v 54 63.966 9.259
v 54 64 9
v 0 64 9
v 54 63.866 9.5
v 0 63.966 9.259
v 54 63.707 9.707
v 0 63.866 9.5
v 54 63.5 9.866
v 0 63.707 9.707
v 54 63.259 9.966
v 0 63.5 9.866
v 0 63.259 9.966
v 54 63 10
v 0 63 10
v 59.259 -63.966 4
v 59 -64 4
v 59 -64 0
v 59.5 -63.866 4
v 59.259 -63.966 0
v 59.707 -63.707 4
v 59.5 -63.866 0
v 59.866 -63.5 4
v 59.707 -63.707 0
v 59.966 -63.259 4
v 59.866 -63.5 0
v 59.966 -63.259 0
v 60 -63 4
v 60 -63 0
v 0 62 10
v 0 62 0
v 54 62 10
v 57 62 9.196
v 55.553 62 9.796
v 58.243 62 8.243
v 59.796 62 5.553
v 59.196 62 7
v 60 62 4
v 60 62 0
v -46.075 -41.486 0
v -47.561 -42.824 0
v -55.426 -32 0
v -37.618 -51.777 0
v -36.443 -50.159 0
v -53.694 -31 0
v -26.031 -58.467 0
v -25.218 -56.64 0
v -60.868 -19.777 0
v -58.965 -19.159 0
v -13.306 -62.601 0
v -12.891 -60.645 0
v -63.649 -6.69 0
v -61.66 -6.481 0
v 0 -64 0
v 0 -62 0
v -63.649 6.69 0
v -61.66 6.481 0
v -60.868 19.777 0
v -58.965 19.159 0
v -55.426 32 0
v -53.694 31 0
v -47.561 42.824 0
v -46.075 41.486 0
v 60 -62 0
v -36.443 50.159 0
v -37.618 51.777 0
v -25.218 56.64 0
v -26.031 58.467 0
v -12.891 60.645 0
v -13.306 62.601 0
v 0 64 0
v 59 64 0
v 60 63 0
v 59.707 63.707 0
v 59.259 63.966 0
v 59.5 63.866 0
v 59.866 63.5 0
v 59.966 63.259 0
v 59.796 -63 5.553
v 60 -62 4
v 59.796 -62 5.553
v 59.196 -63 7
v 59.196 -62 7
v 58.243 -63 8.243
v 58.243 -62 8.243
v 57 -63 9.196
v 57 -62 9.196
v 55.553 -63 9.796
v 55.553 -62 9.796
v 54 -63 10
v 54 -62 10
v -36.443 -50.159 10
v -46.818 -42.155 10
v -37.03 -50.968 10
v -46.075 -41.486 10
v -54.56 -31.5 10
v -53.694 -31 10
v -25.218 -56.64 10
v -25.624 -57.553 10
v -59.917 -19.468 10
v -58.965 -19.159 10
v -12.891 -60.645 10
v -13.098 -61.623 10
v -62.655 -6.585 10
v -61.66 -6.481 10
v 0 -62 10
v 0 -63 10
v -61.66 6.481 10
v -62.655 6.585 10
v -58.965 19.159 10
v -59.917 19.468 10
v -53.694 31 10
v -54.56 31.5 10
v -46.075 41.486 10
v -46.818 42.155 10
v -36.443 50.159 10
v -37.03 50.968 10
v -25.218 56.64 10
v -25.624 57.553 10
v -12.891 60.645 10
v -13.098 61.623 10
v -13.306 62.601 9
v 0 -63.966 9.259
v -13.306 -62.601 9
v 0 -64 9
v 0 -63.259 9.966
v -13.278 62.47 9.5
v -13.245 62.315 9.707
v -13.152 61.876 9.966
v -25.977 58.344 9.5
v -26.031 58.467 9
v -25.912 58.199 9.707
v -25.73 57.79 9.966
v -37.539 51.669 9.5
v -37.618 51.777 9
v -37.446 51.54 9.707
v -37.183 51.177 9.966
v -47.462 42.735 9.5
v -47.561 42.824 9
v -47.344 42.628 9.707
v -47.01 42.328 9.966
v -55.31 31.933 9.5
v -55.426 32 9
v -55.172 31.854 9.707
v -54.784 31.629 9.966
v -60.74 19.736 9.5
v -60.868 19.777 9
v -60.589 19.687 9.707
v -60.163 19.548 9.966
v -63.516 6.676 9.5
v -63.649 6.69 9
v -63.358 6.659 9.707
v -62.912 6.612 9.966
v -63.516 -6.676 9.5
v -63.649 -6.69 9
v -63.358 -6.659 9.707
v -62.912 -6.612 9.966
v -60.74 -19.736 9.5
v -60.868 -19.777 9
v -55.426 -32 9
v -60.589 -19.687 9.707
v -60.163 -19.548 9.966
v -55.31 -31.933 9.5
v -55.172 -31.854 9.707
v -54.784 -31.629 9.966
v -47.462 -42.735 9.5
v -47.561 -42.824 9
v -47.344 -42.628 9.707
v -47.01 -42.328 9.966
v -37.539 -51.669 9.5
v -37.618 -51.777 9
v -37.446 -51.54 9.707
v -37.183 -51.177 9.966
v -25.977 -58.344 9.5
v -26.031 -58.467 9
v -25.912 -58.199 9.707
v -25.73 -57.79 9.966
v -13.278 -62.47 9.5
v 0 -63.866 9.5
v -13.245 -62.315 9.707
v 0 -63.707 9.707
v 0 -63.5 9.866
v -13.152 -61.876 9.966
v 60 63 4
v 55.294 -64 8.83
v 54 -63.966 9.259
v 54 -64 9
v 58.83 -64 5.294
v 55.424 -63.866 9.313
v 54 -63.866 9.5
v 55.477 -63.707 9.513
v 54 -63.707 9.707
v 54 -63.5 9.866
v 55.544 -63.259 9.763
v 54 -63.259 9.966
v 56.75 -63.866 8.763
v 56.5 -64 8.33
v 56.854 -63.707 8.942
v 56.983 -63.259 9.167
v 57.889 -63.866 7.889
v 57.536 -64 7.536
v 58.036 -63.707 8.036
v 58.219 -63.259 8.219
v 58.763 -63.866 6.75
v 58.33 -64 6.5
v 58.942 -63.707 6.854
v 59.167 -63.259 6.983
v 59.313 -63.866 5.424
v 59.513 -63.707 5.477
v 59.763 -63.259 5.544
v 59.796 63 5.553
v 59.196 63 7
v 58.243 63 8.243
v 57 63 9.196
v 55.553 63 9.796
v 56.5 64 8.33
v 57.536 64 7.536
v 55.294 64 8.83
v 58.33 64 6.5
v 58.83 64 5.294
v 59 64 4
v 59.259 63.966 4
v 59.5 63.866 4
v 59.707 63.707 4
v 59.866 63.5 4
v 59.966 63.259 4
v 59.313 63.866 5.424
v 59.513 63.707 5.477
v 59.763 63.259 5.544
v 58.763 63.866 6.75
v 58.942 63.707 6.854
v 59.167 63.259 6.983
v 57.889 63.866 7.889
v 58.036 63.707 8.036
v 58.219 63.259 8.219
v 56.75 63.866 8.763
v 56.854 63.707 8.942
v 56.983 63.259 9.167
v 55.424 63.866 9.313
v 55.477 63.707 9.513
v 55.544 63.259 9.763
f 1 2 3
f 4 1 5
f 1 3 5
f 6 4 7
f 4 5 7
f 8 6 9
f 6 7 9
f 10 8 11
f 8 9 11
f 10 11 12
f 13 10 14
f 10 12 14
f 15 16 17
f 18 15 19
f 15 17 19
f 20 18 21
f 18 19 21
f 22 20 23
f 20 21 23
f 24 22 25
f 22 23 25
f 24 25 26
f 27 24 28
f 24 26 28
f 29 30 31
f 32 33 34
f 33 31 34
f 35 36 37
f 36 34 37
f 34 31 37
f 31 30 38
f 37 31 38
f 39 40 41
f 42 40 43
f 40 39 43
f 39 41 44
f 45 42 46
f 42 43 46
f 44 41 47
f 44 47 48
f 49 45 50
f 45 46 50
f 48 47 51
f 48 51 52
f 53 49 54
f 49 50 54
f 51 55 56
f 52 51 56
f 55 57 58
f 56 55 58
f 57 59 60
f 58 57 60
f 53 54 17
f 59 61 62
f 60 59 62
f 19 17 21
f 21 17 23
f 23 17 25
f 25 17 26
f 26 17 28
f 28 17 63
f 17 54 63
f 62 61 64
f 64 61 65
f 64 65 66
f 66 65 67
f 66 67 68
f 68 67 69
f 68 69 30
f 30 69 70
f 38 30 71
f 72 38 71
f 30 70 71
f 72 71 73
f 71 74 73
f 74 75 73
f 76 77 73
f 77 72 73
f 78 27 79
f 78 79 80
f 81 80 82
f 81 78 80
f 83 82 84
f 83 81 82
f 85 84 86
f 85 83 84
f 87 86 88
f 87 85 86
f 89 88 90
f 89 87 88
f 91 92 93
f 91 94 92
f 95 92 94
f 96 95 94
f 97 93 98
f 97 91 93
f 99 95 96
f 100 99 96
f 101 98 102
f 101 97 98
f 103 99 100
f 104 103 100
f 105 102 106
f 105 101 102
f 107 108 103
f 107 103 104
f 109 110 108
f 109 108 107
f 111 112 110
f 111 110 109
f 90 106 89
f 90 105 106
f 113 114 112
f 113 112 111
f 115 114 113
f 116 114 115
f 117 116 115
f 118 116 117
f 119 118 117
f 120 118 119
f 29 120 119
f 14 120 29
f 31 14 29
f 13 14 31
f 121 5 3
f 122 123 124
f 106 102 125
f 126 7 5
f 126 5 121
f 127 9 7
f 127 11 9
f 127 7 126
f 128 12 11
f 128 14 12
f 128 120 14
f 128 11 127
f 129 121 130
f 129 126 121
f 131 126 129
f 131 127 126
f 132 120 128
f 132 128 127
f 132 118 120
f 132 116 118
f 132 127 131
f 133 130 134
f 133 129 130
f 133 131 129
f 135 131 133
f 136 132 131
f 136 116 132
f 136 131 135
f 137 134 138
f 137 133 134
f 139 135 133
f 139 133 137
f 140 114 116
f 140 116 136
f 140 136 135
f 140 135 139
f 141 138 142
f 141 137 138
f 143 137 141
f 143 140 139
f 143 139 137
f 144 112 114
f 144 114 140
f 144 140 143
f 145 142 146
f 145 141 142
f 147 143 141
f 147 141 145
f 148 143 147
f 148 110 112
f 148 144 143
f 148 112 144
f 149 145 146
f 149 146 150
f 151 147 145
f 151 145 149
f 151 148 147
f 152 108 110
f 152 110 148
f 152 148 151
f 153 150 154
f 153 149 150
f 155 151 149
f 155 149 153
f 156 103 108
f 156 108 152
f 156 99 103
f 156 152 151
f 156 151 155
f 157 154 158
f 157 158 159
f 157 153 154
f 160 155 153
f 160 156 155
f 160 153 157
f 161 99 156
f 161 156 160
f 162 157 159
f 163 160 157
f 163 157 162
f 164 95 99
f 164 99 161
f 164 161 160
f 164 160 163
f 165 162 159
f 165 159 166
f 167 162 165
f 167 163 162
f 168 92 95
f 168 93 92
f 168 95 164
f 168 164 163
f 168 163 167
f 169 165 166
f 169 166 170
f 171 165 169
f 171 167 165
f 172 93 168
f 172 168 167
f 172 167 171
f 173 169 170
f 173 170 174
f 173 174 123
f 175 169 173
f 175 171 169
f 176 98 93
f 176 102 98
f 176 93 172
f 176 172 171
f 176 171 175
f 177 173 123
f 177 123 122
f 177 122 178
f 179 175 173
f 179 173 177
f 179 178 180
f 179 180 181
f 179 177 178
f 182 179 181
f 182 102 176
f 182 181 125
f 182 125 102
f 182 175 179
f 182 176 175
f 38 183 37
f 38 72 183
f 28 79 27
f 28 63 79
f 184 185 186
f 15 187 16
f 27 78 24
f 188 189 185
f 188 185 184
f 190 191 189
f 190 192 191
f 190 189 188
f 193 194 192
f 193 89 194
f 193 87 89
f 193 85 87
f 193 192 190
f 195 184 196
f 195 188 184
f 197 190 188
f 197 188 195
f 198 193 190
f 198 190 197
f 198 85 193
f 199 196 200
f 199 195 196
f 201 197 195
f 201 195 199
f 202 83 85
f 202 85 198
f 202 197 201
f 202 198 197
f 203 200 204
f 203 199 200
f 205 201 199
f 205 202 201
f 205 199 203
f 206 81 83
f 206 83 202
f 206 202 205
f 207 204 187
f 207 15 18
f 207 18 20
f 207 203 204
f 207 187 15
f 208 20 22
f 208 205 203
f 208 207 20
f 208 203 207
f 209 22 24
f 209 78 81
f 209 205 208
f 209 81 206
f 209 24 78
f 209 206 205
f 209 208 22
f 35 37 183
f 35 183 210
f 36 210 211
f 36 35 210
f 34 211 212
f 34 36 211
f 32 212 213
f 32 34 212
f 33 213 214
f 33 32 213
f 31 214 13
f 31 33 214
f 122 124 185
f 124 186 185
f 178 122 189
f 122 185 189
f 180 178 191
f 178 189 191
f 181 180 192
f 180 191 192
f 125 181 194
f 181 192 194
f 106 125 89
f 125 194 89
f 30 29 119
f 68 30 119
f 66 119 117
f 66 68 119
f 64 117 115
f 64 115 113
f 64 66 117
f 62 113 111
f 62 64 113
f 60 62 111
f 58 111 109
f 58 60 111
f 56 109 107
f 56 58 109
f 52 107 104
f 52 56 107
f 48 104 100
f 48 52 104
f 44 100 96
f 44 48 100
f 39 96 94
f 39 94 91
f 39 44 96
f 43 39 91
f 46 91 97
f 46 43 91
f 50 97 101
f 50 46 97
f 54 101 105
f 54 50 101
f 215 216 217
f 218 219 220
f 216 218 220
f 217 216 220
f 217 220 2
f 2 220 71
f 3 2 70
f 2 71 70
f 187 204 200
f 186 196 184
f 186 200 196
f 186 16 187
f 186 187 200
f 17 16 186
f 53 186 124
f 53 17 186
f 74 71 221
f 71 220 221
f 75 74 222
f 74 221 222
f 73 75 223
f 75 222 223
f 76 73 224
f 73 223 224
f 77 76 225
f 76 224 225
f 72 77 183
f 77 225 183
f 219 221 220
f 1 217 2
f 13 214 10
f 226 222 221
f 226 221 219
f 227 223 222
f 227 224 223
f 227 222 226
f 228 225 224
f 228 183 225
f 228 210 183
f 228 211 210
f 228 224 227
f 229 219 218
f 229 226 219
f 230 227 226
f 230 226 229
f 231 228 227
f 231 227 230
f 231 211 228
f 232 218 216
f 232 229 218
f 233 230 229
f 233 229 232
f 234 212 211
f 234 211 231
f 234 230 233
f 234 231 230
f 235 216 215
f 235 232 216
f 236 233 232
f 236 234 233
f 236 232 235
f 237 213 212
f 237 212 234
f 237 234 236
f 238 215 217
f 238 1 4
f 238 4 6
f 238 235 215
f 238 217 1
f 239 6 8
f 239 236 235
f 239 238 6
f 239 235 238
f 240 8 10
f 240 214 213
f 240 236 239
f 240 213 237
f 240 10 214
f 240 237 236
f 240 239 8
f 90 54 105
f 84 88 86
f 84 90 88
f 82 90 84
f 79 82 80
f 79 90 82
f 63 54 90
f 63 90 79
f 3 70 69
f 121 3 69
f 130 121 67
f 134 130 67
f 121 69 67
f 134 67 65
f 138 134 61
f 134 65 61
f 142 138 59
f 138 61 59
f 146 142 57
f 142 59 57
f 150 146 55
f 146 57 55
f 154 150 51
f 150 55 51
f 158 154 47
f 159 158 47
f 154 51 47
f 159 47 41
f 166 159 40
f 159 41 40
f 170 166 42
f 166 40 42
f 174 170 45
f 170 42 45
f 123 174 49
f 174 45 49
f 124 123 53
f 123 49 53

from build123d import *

# Parameters (mm, degrees)
PAD001_DEPTH = 10
FILLET001_R  = 6
FILLET002_R  = 1


with BuildPart() as part:
    # Sketch002 → Pad001 (new body)
    with BuildSketch(Plane.XY):
        with BuildLine():
            Line((60, 64), (0, 64))
            ThreePointArc((0, 64), (-63.999936, 0), (0, -64))
            Line((60, -64), (0, -64))
            Line((60, -62), (60, -64))
            Line((0, -62), (60, -62))
            ThreePointArc((0, 62), (-61.999985, 0), (0, -62))
            Line((0, 62), (60, 62))
            Line((60, 64), (60, 62))
        make_face()
    extrude(amount=PAD001_DEPTH)

    # Fillet001
    fillet001_edges = [part.edges().sort_by_distance(p)[0] for p in [
        (60, -63, 10),
        (60, 63, 10),
    ]]
    fillet(fillet001_edges, radius=FILLET001_R)

    # Fillet002
    fillet002_edges = [part.edges().sort_by_distance(p)[0] for p in [
        (27, 64, 10),
    ]]
    fillet(fillet002_edges, radius=FILLET002_R)


solid = part.part
